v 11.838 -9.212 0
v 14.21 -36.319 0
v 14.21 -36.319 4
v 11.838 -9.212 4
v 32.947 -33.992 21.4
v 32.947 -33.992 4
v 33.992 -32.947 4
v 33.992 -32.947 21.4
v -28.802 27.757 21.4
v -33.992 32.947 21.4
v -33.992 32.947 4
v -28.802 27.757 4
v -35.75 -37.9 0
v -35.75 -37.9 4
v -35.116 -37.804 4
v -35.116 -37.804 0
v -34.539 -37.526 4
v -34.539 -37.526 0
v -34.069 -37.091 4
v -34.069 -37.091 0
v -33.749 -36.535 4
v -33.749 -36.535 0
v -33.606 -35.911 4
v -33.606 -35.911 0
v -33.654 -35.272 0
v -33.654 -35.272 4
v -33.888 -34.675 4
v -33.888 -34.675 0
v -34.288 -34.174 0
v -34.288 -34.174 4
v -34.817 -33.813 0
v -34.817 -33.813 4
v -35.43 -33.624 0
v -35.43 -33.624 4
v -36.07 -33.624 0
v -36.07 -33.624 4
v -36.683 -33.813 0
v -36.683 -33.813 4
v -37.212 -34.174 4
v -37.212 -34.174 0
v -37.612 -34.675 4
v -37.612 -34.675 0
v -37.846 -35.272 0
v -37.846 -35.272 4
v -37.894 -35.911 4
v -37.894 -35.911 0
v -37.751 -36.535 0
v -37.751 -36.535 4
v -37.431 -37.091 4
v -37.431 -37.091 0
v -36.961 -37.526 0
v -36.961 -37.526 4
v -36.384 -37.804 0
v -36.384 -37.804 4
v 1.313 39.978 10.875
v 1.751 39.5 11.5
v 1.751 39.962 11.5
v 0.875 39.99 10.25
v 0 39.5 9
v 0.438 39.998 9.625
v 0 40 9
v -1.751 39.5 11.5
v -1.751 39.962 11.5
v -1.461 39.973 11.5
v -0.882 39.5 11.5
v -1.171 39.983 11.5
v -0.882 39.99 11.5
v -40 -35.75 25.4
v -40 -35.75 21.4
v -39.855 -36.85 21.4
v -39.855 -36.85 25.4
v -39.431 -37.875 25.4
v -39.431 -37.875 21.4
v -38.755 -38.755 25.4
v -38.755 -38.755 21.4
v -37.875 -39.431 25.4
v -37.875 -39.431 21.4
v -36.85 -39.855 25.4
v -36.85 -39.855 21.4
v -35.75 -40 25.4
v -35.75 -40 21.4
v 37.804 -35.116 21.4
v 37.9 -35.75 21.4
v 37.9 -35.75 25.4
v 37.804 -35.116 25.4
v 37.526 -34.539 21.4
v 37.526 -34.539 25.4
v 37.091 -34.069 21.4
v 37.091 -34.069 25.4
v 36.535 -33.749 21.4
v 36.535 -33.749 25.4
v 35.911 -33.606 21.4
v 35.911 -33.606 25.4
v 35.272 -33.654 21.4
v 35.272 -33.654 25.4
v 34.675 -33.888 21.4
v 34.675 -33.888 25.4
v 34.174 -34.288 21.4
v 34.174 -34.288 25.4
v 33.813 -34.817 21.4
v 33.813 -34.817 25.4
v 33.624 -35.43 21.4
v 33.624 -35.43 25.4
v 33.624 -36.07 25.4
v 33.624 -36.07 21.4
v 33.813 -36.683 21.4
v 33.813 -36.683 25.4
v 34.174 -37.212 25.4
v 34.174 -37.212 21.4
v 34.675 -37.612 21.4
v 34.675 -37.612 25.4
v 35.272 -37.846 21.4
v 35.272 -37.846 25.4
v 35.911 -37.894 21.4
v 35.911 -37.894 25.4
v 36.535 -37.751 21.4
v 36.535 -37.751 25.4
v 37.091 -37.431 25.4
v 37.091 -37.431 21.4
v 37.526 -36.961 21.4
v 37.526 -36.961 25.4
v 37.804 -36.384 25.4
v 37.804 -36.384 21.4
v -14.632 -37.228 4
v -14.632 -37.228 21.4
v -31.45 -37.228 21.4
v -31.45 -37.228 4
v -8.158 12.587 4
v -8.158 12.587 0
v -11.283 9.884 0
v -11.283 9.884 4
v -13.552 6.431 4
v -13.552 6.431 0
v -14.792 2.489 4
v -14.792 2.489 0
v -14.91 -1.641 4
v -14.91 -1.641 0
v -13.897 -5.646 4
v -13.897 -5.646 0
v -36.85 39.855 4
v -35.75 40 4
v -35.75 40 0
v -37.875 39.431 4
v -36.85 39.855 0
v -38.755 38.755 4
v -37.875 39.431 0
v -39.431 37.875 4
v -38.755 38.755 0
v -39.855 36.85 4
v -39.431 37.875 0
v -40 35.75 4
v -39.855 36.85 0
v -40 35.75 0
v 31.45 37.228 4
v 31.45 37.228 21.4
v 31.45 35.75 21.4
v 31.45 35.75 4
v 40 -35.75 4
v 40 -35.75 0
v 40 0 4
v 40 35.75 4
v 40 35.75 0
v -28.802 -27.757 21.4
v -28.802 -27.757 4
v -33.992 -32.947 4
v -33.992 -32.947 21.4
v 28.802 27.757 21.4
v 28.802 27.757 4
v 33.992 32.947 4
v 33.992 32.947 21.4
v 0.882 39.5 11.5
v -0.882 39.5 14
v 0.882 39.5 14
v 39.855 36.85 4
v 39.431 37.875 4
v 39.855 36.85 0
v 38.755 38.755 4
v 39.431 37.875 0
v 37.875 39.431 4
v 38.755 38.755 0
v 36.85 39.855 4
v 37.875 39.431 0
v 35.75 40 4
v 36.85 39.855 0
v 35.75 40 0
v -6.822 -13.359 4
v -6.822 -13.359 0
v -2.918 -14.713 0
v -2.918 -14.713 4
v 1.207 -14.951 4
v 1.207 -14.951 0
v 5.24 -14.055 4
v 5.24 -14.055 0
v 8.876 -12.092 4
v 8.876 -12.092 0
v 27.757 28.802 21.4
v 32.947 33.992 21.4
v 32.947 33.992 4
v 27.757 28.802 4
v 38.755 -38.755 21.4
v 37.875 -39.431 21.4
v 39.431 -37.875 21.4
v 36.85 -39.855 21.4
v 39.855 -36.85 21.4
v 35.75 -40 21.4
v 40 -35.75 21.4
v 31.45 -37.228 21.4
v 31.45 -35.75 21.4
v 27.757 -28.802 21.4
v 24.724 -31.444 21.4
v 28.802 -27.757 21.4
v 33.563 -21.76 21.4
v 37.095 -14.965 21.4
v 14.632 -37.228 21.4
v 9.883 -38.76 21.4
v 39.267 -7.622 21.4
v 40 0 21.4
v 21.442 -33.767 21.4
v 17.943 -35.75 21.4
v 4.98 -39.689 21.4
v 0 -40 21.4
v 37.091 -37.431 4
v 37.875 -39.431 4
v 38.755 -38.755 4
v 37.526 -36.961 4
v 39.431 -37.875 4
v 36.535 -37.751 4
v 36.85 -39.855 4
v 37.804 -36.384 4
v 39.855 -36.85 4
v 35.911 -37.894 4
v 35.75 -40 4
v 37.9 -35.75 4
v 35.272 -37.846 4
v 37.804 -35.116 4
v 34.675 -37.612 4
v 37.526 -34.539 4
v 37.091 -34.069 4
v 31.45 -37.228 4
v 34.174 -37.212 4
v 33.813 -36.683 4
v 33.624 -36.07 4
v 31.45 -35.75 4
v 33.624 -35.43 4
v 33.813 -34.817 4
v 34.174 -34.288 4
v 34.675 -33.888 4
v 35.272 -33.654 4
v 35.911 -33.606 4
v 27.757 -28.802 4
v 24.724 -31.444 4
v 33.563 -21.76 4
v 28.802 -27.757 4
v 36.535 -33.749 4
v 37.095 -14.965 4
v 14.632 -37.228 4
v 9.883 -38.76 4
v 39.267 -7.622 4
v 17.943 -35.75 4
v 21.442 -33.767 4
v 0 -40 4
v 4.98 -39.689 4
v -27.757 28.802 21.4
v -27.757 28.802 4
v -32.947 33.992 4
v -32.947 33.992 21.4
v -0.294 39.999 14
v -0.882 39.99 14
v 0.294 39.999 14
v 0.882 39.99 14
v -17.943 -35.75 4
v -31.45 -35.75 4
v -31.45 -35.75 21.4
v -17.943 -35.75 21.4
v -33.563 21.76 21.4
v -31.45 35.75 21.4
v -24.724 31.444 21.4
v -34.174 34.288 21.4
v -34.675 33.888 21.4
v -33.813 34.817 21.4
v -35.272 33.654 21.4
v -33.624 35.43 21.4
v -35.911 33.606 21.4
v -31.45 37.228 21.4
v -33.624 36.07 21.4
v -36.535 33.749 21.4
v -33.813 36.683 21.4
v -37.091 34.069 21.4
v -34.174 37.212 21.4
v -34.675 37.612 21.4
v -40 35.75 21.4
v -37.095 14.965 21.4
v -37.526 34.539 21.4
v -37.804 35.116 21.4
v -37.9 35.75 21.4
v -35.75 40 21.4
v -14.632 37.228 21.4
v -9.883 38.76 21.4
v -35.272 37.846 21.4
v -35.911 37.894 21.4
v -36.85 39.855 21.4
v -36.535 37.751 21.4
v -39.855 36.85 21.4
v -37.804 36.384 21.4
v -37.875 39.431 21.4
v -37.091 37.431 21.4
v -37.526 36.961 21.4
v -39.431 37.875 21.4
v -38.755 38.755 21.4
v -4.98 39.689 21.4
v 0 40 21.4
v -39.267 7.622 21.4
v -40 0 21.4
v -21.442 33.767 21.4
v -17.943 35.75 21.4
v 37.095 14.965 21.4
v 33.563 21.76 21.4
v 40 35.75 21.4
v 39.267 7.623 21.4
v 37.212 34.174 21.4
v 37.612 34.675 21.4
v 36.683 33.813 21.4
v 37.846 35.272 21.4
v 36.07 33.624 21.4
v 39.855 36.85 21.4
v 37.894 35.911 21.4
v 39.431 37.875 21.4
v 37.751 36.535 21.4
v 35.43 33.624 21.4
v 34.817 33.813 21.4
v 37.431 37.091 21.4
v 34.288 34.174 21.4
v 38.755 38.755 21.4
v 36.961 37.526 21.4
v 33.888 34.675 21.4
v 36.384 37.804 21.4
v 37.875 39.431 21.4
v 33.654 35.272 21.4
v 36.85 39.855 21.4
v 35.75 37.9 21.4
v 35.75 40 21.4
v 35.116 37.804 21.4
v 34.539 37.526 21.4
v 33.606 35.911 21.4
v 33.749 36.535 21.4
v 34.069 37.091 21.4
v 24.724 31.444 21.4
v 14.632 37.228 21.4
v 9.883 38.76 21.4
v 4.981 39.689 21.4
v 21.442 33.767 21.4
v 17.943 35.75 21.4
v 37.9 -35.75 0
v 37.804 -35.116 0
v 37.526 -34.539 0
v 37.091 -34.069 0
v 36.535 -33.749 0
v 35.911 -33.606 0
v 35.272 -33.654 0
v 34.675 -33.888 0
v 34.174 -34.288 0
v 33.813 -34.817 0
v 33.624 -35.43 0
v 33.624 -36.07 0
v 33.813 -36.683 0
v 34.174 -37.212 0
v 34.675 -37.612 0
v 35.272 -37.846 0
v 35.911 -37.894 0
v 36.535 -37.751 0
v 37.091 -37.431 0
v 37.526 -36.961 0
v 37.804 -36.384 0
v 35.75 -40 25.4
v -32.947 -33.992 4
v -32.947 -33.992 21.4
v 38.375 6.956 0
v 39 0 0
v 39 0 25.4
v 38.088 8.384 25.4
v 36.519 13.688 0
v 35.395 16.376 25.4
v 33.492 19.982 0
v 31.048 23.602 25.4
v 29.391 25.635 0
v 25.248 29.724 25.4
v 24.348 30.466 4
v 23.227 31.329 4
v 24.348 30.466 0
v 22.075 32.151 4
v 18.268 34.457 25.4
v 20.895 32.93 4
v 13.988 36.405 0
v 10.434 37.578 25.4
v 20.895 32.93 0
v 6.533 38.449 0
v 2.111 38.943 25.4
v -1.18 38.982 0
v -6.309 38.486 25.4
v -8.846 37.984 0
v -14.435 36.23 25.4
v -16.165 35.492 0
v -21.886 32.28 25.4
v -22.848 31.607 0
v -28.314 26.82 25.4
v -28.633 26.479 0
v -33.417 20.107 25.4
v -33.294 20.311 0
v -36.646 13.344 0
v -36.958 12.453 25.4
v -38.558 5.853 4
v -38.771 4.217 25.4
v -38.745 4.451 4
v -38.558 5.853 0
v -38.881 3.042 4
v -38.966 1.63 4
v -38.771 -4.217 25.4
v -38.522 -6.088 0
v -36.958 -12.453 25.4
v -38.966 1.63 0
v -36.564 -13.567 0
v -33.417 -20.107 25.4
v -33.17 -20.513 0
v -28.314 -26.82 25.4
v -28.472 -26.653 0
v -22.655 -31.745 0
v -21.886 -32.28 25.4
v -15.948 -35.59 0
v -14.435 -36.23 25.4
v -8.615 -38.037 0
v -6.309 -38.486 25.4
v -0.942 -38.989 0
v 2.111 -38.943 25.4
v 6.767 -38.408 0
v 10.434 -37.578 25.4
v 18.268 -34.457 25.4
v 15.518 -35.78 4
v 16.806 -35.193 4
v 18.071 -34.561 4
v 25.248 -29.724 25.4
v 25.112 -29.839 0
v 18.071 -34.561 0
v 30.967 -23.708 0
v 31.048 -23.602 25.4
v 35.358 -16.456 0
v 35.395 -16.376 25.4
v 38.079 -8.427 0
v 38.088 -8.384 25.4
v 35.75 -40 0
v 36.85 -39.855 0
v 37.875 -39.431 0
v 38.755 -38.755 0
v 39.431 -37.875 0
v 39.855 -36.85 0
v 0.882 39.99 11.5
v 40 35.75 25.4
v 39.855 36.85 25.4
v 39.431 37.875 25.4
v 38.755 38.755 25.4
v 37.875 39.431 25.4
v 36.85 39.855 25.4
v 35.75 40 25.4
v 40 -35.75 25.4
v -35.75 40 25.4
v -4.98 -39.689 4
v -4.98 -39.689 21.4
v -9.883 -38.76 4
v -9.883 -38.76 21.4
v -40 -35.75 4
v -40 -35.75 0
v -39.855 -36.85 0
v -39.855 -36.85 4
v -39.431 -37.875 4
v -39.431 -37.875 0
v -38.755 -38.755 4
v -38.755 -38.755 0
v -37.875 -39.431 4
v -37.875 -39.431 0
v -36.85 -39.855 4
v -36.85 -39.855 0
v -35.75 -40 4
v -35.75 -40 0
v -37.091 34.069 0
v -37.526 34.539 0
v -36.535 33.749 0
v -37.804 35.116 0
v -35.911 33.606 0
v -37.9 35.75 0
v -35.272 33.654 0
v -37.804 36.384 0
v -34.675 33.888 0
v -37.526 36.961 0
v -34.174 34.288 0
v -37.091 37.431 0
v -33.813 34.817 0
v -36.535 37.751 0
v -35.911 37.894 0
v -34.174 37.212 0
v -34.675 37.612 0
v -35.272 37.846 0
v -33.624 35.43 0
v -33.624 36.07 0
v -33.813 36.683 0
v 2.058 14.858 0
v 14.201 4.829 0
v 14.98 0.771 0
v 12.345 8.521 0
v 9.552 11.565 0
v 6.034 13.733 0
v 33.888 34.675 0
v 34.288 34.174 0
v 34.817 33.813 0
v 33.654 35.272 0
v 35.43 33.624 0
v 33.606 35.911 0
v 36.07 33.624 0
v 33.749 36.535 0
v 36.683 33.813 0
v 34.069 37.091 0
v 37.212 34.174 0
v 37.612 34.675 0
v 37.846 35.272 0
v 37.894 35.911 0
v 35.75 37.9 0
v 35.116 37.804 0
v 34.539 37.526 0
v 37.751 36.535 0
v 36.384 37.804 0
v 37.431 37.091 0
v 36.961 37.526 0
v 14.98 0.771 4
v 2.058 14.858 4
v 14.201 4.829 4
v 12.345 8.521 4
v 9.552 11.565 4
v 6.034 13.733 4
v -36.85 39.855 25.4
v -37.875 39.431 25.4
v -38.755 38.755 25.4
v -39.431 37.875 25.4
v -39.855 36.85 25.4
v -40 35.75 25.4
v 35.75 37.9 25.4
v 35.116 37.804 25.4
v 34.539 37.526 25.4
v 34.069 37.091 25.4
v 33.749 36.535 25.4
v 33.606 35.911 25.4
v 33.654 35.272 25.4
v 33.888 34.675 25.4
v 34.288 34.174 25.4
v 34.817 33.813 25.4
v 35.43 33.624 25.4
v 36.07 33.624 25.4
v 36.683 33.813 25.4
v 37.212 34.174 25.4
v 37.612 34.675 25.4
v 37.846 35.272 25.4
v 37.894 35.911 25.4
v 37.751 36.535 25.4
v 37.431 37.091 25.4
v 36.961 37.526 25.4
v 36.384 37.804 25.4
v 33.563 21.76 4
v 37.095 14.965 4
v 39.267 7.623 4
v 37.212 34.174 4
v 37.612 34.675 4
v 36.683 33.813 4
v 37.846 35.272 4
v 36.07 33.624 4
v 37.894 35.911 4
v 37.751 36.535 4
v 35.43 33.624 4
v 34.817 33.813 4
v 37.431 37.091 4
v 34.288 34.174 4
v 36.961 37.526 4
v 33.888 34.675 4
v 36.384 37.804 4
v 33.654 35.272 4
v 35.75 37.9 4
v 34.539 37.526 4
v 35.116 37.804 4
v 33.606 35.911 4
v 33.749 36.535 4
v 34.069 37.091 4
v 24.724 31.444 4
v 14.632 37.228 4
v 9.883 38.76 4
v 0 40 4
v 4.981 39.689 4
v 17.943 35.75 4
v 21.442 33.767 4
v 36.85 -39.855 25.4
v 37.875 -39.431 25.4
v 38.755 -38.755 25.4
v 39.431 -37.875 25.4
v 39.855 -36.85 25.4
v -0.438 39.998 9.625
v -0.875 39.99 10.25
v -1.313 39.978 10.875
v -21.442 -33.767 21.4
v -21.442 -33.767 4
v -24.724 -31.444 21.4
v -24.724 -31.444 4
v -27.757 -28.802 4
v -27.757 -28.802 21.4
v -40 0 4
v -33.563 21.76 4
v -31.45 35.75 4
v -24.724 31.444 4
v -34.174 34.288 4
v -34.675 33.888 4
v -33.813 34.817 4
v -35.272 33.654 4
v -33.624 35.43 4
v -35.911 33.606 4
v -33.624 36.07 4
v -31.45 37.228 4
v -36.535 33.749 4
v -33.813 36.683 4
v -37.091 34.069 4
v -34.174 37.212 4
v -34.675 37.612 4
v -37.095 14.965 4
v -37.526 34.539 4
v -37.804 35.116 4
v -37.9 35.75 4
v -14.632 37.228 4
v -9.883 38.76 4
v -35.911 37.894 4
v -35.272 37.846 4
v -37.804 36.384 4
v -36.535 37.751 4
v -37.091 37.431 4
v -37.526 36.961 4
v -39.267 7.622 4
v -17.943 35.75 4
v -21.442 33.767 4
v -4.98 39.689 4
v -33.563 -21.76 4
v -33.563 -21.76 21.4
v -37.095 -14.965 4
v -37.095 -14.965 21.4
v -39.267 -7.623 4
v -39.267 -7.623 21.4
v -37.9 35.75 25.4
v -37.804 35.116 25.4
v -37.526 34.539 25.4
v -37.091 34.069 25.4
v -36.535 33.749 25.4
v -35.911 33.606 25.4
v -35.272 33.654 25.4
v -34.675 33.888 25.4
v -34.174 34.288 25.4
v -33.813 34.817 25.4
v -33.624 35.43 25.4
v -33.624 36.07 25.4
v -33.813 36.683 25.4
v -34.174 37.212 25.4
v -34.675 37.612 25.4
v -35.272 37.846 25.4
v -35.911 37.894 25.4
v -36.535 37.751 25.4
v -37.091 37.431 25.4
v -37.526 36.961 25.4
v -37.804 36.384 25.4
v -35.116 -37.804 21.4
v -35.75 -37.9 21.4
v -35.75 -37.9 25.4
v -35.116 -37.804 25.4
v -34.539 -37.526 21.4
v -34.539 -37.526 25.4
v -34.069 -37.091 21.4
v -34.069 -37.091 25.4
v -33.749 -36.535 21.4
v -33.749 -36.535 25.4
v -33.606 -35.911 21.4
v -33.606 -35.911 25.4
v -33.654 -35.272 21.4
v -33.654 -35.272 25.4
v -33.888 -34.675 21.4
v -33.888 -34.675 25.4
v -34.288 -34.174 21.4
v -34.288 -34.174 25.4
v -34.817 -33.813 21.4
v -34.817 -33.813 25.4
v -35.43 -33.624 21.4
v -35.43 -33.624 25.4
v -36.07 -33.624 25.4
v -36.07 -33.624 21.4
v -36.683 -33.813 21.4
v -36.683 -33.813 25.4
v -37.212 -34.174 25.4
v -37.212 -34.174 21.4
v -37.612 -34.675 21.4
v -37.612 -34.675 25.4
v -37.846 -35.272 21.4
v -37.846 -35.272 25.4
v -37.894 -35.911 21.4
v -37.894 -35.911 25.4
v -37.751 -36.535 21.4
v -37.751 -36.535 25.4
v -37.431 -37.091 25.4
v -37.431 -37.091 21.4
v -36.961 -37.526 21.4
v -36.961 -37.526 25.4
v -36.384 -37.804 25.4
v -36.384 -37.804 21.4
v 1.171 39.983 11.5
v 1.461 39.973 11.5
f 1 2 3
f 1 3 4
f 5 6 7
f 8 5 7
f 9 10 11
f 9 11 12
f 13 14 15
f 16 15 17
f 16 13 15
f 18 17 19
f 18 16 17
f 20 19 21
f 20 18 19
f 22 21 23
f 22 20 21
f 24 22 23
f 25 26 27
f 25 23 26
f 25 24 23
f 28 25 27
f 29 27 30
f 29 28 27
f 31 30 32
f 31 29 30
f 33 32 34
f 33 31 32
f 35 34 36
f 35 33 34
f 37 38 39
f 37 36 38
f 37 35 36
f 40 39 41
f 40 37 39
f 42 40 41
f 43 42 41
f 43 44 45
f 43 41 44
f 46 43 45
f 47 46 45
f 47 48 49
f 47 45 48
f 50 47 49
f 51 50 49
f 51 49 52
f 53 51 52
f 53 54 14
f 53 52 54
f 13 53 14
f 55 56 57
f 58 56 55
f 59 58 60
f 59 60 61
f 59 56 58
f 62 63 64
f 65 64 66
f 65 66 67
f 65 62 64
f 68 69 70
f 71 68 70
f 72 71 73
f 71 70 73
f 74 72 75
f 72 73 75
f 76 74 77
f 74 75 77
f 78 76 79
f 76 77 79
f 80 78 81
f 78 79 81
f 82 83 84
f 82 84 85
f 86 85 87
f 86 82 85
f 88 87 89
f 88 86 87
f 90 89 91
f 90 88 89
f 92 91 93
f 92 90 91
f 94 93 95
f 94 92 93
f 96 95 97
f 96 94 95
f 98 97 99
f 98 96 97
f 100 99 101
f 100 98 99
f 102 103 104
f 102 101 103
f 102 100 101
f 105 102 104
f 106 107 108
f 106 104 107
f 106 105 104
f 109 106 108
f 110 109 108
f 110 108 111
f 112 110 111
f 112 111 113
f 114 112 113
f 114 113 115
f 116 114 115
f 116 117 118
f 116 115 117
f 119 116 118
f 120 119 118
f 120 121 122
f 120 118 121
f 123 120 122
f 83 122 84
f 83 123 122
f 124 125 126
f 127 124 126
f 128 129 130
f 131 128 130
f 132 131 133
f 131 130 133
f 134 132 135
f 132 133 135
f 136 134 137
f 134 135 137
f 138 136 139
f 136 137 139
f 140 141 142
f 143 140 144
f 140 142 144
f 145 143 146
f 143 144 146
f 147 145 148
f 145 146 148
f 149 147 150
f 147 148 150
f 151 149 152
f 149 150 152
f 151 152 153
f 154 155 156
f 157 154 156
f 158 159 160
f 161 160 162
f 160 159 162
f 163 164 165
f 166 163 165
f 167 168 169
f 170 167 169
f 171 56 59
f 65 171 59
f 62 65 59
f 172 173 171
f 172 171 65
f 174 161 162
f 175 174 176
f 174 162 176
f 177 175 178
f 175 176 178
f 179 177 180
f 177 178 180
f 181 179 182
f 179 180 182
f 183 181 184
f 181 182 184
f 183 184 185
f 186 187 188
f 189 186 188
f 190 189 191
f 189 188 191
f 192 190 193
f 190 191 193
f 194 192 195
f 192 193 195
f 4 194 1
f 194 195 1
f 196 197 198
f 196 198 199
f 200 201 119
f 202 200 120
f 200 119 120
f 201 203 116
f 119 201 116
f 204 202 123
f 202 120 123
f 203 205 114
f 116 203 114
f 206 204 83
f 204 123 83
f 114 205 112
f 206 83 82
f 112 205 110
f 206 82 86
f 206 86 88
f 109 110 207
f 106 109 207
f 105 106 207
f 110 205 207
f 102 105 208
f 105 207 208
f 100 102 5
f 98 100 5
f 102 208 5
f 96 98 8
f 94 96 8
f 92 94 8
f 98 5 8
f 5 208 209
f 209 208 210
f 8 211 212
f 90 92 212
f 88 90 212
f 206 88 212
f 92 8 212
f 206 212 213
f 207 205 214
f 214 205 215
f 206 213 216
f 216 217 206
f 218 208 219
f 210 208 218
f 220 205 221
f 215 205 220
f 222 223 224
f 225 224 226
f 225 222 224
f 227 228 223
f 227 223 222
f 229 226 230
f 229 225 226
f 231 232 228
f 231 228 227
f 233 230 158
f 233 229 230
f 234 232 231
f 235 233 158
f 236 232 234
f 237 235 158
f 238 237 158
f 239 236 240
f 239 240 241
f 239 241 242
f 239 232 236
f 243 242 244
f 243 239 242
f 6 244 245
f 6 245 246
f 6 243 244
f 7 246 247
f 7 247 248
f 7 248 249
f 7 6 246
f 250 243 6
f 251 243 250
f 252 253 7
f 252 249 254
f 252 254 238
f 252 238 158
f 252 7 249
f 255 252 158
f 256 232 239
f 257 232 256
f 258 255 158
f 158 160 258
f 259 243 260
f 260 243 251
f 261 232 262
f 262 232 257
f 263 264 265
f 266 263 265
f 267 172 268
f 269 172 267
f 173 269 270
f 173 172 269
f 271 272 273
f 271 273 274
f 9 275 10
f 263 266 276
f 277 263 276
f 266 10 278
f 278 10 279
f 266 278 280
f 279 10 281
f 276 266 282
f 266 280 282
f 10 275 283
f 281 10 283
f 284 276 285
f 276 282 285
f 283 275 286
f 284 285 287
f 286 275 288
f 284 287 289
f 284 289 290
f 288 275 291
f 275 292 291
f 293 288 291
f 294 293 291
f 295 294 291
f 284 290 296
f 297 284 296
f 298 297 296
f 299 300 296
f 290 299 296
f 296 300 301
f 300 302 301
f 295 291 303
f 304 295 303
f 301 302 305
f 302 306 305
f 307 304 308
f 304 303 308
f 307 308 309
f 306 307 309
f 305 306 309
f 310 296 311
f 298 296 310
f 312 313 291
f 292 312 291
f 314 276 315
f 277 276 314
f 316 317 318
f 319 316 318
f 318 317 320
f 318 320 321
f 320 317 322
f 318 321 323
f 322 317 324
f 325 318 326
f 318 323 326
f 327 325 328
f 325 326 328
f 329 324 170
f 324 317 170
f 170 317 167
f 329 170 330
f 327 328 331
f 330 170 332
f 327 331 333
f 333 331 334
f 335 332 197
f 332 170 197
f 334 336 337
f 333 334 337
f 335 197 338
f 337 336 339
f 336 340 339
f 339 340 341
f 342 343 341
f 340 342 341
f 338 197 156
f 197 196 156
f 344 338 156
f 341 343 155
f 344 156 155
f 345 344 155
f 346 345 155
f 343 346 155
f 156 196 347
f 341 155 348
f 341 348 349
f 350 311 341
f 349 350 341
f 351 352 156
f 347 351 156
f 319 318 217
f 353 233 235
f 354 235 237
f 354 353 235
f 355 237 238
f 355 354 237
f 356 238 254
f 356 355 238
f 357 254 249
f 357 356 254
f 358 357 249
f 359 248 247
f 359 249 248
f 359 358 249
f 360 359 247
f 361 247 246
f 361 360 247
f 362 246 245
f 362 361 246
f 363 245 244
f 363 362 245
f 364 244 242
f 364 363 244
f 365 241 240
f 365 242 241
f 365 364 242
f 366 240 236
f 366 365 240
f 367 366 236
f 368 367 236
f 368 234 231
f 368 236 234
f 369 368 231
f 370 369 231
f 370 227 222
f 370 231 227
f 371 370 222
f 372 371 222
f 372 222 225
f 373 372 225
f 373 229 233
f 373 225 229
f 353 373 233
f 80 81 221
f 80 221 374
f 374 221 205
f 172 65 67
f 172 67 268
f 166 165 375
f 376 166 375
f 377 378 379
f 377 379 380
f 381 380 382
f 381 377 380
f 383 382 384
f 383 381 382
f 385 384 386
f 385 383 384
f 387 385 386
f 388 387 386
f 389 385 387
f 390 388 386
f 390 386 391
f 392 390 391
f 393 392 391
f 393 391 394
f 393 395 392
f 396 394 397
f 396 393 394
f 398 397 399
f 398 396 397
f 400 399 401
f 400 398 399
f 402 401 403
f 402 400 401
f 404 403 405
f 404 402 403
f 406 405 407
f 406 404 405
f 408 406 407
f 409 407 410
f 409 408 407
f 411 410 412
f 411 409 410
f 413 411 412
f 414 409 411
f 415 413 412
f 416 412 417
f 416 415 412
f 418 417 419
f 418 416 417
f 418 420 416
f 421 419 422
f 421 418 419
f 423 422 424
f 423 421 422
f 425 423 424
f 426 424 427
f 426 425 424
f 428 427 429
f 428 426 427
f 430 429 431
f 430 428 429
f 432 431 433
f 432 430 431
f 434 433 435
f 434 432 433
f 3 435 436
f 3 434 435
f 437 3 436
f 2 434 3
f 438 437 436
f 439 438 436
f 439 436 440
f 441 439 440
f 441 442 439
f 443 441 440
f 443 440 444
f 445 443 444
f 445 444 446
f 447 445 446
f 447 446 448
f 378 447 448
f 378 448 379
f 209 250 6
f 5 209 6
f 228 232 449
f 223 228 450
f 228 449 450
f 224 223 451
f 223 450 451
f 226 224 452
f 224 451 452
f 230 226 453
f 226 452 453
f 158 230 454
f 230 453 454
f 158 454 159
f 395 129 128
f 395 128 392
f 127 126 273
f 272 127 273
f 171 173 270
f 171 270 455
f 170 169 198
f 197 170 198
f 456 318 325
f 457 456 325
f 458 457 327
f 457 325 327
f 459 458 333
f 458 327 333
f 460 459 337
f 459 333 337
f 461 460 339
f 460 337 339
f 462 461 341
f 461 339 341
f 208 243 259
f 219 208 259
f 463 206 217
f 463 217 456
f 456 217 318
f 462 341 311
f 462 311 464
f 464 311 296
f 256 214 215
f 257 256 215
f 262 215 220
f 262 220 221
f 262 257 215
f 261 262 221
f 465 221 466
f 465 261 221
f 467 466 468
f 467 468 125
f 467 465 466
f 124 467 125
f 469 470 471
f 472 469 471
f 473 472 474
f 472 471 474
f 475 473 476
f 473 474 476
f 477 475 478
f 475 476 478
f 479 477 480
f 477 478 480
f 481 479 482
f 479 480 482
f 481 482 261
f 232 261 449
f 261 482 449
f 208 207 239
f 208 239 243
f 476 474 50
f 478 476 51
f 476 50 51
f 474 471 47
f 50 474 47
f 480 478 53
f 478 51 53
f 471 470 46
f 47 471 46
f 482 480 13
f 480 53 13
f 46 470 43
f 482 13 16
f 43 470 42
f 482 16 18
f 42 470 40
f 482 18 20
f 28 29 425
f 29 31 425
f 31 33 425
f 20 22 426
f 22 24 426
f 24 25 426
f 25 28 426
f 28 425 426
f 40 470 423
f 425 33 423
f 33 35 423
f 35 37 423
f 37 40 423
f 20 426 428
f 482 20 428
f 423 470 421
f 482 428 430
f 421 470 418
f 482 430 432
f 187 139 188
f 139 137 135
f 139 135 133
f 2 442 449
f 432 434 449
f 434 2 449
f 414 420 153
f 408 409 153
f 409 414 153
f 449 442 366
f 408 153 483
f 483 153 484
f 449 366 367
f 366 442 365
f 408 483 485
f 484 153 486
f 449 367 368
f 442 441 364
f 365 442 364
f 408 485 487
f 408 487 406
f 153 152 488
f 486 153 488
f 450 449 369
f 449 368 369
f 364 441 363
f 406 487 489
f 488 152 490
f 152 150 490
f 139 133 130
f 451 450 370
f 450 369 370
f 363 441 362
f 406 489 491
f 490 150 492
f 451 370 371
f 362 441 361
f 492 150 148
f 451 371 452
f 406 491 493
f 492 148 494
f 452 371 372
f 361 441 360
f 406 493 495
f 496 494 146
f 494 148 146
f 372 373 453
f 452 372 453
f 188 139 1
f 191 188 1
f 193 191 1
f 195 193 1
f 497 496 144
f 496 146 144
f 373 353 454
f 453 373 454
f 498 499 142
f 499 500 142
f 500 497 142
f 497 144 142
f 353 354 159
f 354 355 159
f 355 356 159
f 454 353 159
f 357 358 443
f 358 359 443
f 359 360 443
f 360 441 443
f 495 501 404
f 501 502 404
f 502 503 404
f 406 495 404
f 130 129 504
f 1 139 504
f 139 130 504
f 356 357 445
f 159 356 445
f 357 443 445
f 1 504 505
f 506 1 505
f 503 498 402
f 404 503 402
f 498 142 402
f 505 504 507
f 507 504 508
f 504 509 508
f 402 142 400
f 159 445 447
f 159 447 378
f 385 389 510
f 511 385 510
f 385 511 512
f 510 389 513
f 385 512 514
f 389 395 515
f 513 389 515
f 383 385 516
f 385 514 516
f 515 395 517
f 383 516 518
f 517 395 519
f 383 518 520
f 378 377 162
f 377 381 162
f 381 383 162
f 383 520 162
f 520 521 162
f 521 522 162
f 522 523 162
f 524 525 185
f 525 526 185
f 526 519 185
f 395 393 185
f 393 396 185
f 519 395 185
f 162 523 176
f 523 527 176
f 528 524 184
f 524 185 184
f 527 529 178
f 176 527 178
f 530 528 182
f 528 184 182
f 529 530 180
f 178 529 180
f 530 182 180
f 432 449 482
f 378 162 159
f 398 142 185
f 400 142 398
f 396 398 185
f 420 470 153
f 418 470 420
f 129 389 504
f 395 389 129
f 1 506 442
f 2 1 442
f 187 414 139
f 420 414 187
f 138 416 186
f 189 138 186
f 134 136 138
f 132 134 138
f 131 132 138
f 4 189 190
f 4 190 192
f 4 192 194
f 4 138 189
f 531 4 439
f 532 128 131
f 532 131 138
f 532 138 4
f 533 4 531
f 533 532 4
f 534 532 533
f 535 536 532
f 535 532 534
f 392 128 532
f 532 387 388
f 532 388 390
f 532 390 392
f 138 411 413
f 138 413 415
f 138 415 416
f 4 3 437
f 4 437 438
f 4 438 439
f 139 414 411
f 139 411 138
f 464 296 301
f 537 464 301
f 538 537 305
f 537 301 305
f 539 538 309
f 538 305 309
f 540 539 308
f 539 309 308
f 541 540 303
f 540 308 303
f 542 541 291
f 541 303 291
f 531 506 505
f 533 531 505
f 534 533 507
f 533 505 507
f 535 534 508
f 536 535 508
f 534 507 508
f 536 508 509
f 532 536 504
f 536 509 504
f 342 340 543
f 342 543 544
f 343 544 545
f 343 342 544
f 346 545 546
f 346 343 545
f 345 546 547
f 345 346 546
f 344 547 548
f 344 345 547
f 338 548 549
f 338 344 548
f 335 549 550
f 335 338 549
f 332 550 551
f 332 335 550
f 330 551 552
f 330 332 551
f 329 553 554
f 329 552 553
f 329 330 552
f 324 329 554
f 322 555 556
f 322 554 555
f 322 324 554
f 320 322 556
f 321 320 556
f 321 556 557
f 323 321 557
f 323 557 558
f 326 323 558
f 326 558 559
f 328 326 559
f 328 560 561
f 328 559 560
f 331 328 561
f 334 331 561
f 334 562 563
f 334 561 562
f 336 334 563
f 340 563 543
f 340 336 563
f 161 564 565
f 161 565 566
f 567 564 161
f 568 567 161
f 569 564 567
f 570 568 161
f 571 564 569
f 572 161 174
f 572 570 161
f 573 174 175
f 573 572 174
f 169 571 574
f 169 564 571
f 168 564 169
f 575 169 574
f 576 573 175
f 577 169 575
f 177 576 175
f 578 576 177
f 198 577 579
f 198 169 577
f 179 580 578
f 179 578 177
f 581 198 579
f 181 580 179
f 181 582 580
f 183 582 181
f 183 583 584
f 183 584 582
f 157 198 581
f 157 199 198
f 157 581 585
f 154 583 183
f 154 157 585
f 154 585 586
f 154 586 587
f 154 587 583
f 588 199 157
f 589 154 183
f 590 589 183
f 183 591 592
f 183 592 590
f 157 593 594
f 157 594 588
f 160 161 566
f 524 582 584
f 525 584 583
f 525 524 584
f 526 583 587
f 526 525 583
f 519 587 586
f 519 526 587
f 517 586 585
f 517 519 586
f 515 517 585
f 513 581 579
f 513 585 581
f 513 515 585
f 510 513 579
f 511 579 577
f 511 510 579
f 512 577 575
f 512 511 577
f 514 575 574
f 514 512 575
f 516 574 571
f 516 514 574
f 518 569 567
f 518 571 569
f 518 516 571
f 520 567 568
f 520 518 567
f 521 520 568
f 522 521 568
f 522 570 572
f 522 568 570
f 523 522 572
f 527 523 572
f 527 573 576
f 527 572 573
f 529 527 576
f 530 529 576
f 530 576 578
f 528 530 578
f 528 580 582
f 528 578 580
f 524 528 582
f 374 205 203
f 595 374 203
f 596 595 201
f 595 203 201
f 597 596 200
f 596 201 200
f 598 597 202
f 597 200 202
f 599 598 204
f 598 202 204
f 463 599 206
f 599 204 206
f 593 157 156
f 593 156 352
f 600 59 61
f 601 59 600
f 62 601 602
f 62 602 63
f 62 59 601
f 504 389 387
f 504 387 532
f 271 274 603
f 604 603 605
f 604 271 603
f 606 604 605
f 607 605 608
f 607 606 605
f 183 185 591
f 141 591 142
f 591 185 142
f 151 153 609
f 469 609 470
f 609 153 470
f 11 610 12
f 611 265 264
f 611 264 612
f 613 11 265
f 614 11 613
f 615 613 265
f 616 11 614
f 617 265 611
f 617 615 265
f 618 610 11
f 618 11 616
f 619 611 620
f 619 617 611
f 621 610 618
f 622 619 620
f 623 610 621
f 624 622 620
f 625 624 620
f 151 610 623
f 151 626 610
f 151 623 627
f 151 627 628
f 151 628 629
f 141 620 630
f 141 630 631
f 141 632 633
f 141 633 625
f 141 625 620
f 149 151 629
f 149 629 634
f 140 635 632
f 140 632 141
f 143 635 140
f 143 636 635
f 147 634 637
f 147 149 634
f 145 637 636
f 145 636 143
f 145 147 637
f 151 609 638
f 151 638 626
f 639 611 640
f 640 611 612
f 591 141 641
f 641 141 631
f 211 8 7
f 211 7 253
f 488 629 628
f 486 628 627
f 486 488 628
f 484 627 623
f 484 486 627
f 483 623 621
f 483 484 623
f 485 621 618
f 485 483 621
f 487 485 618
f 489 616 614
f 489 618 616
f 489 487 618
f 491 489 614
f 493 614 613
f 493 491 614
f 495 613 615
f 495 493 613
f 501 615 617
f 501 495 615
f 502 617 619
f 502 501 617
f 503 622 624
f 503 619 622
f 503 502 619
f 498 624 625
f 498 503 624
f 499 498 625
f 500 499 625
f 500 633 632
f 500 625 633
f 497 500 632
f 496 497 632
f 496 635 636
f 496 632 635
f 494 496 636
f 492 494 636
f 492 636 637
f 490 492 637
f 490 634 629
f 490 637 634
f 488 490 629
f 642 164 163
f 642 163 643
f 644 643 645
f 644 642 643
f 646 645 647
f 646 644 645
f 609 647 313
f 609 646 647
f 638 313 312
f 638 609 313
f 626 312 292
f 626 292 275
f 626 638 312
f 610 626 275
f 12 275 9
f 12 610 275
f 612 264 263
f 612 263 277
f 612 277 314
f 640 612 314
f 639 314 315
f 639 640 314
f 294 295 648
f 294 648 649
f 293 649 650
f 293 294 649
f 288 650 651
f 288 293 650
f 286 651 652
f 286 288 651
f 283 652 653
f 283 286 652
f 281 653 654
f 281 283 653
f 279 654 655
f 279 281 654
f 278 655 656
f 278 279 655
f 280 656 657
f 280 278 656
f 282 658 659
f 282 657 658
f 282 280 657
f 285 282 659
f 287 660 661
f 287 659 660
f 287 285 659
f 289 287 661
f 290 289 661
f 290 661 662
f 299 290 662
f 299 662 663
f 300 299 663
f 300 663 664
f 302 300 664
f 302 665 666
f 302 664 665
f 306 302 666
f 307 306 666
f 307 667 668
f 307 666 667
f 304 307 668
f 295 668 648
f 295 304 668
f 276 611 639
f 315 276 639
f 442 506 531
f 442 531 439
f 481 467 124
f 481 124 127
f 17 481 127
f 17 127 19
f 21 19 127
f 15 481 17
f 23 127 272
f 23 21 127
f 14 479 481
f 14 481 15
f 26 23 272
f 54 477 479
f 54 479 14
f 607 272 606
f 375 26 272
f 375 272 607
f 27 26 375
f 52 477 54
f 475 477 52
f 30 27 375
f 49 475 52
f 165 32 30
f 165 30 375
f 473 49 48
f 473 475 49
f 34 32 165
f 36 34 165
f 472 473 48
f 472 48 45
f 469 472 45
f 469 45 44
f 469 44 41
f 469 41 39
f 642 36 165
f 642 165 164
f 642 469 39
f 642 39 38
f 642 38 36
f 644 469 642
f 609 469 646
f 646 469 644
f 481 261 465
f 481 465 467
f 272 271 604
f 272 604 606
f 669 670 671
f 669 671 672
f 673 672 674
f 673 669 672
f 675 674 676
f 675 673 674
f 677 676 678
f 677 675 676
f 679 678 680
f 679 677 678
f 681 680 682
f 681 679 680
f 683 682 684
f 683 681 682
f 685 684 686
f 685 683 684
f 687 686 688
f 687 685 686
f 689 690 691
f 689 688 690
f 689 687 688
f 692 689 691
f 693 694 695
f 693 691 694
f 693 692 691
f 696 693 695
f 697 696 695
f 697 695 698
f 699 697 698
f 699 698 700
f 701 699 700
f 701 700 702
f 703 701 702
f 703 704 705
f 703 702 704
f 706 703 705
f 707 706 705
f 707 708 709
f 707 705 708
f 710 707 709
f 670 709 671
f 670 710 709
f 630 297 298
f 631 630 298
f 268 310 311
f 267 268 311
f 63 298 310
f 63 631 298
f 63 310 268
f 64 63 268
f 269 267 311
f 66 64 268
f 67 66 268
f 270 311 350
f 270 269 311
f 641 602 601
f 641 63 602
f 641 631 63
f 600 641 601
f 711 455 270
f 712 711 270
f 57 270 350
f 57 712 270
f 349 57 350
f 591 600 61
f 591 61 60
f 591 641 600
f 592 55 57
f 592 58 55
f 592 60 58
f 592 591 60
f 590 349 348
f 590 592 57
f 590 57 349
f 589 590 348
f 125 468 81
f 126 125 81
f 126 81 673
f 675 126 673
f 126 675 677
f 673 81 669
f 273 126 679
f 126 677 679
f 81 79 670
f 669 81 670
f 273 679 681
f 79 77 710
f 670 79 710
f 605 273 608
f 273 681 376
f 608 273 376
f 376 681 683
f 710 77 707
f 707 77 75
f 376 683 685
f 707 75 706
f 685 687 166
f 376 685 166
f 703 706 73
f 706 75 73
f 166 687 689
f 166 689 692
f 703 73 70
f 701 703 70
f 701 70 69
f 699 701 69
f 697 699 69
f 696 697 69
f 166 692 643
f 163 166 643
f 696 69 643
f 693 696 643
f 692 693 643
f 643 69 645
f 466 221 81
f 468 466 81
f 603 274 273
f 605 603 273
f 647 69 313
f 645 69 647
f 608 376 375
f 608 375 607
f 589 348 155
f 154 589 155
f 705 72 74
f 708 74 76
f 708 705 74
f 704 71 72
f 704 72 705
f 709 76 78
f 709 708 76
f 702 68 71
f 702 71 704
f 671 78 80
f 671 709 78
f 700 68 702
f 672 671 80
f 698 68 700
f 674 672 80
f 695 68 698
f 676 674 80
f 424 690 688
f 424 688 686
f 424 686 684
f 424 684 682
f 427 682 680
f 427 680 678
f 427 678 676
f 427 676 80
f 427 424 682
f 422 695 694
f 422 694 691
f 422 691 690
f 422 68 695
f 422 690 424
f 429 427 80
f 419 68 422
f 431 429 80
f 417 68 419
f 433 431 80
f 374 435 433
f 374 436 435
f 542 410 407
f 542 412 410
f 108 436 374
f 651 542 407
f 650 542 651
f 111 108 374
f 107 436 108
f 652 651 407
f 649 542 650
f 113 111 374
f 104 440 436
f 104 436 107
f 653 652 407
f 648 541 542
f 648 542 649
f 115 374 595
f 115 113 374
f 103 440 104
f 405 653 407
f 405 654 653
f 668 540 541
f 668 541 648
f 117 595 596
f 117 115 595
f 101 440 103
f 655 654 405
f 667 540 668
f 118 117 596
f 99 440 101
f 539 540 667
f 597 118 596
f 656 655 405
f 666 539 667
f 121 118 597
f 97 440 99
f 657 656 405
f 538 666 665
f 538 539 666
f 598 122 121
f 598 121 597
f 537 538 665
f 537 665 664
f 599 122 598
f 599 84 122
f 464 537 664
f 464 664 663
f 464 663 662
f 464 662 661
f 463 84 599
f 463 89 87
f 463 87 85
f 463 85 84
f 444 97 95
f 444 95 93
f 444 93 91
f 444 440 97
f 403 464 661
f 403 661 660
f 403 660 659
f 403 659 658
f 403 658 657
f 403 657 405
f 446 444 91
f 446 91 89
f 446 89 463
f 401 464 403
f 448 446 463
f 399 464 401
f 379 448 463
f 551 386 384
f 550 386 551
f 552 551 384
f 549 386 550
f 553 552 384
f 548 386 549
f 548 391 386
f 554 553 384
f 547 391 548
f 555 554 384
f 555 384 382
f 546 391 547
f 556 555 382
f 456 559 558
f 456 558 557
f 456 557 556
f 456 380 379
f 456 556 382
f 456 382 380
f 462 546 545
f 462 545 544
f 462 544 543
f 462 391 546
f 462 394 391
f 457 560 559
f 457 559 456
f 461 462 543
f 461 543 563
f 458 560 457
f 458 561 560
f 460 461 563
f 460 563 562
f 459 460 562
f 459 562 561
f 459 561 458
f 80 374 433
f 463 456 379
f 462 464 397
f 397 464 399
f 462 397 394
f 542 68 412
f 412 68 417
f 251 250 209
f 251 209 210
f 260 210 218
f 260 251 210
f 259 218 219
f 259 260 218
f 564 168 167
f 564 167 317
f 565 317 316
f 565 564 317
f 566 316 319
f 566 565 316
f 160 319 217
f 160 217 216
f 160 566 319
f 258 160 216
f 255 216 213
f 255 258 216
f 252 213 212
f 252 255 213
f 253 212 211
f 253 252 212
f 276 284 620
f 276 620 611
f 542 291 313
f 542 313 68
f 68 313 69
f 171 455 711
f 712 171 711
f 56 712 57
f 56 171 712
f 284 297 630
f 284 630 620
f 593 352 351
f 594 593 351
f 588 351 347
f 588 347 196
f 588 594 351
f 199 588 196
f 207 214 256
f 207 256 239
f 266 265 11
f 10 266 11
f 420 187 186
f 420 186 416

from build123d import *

# Parameters (mm, degrees)
SKETCH_BODY_R                       = 39
BODY_DEPTH                          = 25.4
SKETCH_CUT_BODY_W                   = 17.4
SKETCH_CUT_BODY_H                   = 14.808134855
REINFORCMENT_STRIP_REACH            = 64.009
CIRPATTERN_REINFORCMENT_STRIP_COUNT = 4
SKETCH_FIXING_HOLE_R                = 2.15
FIXING_HOLE_DEPTH                   = 63.009354133
CIRPATTERN_FIXING_HOLE_COUNT        = 4
BONE_DEPTH                          = 4
CIRPATTERN_BONE_COUNT               = 3
REINFORCMENT_PLATES_REACH           = 64.009
SKETCH_FIXING_PLATE_FAN_R           = 15
FIXING_PLATE_FAN_DEPTH              = 4
AIR_EXHAUST_DEPTH                   = 93.549500269


with BuildPart() as part:
    # Sketch-Body → Body (new body)
    with BuildSketch(Plane.XY):
        with BuildLine():
            Line((-35.75, -40), (35.75, -40))
            ThreePointArc((35.75, -40), (38.75520382, -38.75520382), (40, -35.75))
            Line((40, -35.75), (40, 35.75))
            ThreePointArc((40, 35.75), (38.75520382, 38.75520382), (35.75, 40))
            Line((35.75, 40), (-35.75, 40))
            ThreePointArc((-35.75, 40), (-38.75520382, 38.75520382), (-40, 35.75))
            Line((-40, 35.75), (-40, -35.75))
            ThreePointArc((-40, -35.75), (-38.75520382, -38.75520382), (-35.75, -40))
        make_face()
        Circle(SKETCH_BODY_R, mode=Mode.SUBTRACT)
    extrude(amount=BODY_DEPTH)

    # Sketch-Cut-Body → Cut-Body (revolve, cut)
    with BuildSketch(Plane(origin=(0, 0, 0), x_dir=(0, 0, -1), z_dir=(1, 0, 0)), mode=Mode.PRIVATE) as cut_body_sk:
        with Locations((-12.7, 47.404067428)):
            Rectangle(SKETCH_CUT_BODY_W, SKETCH_CUT_BODY_H)
    revolve(cut_body_sk.sketch.rotate(Axis((0, 0, 25.4), (0, 0, -1)), 180), axis=Axis((0, 0, 25.4), (0, 0, -1)), mode=Mode.SUBTRACT)

    # Sketch-Reinforcment-Strip → Reinforcment-Strip (add, up to next)
    with BuildSketch(Plane.XY, mode=Mode.PRIVATE) as reinforcment_strip_sk1:
        with BuildLine():
            Line((28.801838692, 27.757054743), (33.991972605, 32.947188656))
            Line((33.991972605, 32.947188656), (32.947188656, 33.991972605))
            Line((32.947188656, 33.991972605), (27.757054743, 28.801838692))
            ThreePointArc((27.757054743, 28.801838692), (28.284271247, 28.284271247), (28.801838692, 27.757054743))
        make_face()
    reinforcment_strip_tool1 = extrude(reinforcment_strip_sk1.sketch, amount=REINFORCMENT_STRIP_REACH, mode=Mode.PRIVATE) - part.part
    reinforcment_strip = reinforcment_strip_tool1.solids().sort_by_distance((30.876122, 30.876122, 0))[0]
    add(reinforcment_strip)

    # CirPattern-Reinforcment-Strip: Reinforcment-Strip ×4 about axis
    cirpattern_reinforcment_strip_axis = Axis((0, 0, 0), (0, 0, 1))
    for i in range(1, CIRPATTERN_REINFORCMENT_STRIP_COUNT):
        add(reinforcment_strip.rotate(cirpattern_reinforcment_strip_axis, i * 360 / CIRPATTERN_REINFORCMENT_STRIP_COUNT))

    # Sketch-Fixing-Hole → Fixing-Hole (cut, through all)
    with BuildSketch(Plane.XY):
        with Locations(Location((35.75, 35.75, 0), (0, 0, 90))):
            Circle(SKETCH_FIXING_HOLE_R)
    fixing_hole = extrude(amount=FIXING_HOLE_DEPTH, mode=Mode.SUBTRACT)

    # CirPattern-Fixing-Hole: Fixing-Hole ×4 about axis
    cirpattern_fixing_hole_axis = Axis((0, 0, 0), (0, 0, 1))
    for i in range(1, CIRPATTERN_FIXING_HOLE_COUNT):
        add(fixing_hole.rotate(cirpattern_fixing_hole_axis, i * 360 / CIRPATTERN_FIXING_HOLE_COUNT), mode=Mode.SUBTRACT)

    # Sketch-Bone → Bone (add)
    with BuildSketch(Plane.XY):
        with BuildLine():
            Line((14.980149429, 0.771442214), (18.07129405, -34.560502476))
            ThreePointArc((18.07129405, -34.560502476), (16.164518677, -35.492370109), (14.209874971, -36.319133433))
            Line((14.209874971, -36.319133433), (11.838280423, -9.211683702))
            ThreePointArc((11.838280423, -9.211683702), (14.308135647, -4.503027238), (14.980149429, 0.771442214))
        make_face()
    bone = extrude(amount=BONE_DEPTH)

    # CirPattern-Bone: Bone ×3 about axis
    cirpattern_bone_axis = Axis((0, 0, 0), (0, 0, 1))
    for i in range(1, CIRPATTERN_BONE_COUNT):
        add(bone.rotate(cirpattern_bone_axis, i * 360 / CIRPATTERN_BONE_COUNT))

    # Sketch3 → Reinforcment-Plates (add, up to next)
    with BuildSketch(Plane.XY, mode=Mode.PRIVATE) as reinforcment_plates_sk1:
        with BuildLine():
            Line((14.632487739, 37.227547631), (31.45, 37.227547631))
            Line((31.45, 37.227547631), (31.45, 35.75))
            Line((31.45, 35.75), (17.942616866, 35.75))
            ThreePointArc((17.942616866, 35.75), (16.304298413, 36.526289892), (14.632487739, 37.227547631))
        make_face()
    reinforcment_plates_tool1 = extrude(reinforcment_plates_sk1.sketch, amount=REINFORCMENT_PLATES_REACH, mode=Mode.PRIVATE) - part.part
    # Sketch3 → Reinforcment-Plates (add, up to next)
    with BuildSketch(Plane.XY, mode=Mode.PRIVATE) as reinforcment_plates_sk2:
        with BuildLine():
            Line((-31.45, 35.75), (-17.942616866, 35.75))
            ThreePointArc((-17.942616866, 35.75), (-16.304298413, 36.526289892), (-14.632487739, 37.227547631))
            Line((-14.632487739, 37.227547631), (-31.45, 37.227547631))
            Line((-31.45, 37.227547631), (-31.45, 35.75))
        make_face()
    reinforcment_plates_tool2 = extrude(reinforcment_plates_sk2.sketch, amount=REINFORCMENT_PLATES_REACH, mode=Mode.PRIVATE) - part.part
    # Sketch3 → Reinforcment-Plates (add, up to next)
    with BuildSketch(Plane.XY, mode=Mode.PRIVATE) as reinforcment_plates_sk3:
        with BuildLine():
            Line((-31.45, -37.227547631), (-31.45, -35.75))
            Line((-31.45, -35.75), (-17.942616866, -35.75))
            ThreePointArc((-17.942616866, -35.75), (-16.304298413, -36.526289892), (-14.632487739, -37.227547631))
            Line((-14.632487739, -37.227547631), (-31.45, -37.227547631))
        make_face()
    reinforcment_plates_tool3 = extrude(reinforcment_plates_sk3.sketch, amount=REINFORCMENT_PLATES_REACH, mode=Mode.PRIVATE) - part.part
    # Sketch3 → Reinforcment-Plates (add, up to next)
    with BuildSketch(Plane.XY, mode=Mode.PRIVATE) as reinforcment_plates_sk4:
        with BuildLine():
            Line((14.632487739, -37.227547631), (31.45, -37.227547631))
            Line((31.45, -37.227547631), (31.45, -35.75))
            Line((31.45, -35.75), (17.942616866, -35.75))
            ThreePointArc((17.942616866, -35.75), (16.304298413, -36.526289892), (14.632487739, -37.227547631))
        make_face()
    reinforcment_plates_tool4 = extrude(reinforcment_plates_sk4.sketch, amount=REINFORCMENT_PLATES_REACH, mode=Mode.PRIVATE) - part.part
    add(reinforcment_plates_tool1.solids().sort_by_distance((23.872253, 36.515707, 0))[0])
    add(reinforcment_plates_tool2.solids().sort_by_distance((-23.872253, 36.515707, 0))[0])
    add(reinforcment_plates_tool3.solids().sort_by_distance((-23.872253, -36.515707, 0))[0])
    add(reinforcment_plates_tool4.solids().sort_by_distance((23.872253, -36.515707, 0))[0])

    # Sketch-Fixing-Plate-Fan → Fixing-Plate-Fan (add)
    with BuildSketch(Plane.XY):
        Circle(SKETCH_FIXING_PLATE_FAN_R)
    extrude(amount=FIXING_PLATE_FAN_DEPTH)

    # Sketch5 → Air-Exhaust (cut, through all)
    with BuildSketch(Plane(origin=(0, 39.5, 0), x_dir=(-1, 0, 0), z_dir=(0, 1, 0))):
        Polygon((0.881634904, 14), (-0.881634904, 14), (-0.881634904, 11.5), (-1.750518846, 11.5), (0, 9), (1.750518846, 11.5), (0.881634904, 11.5), align=None)
    extrude(amount=AIR_EXHAUST_DEPTH, mode=Mode.SUBTRACT)


solid = part.part
